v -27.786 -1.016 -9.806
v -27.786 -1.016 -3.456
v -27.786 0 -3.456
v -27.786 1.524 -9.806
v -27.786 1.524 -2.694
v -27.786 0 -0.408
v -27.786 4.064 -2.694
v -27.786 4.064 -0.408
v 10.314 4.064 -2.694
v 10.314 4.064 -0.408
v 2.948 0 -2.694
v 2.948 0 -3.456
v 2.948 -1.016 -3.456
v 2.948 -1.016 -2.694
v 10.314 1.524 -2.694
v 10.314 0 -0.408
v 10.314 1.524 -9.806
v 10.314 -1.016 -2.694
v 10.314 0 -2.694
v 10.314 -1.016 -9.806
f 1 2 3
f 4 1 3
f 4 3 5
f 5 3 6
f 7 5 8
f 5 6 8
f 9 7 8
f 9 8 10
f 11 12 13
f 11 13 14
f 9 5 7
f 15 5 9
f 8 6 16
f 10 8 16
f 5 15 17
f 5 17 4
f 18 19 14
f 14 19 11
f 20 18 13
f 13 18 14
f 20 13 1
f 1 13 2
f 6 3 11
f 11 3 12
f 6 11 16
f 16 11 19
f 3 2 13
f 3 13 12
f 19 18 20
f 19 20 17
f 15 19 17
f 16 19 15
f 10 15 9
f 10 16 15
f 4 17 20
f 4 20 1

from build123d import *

# Parameters (mm, degrees)
SKETCH1_W           = 38.1
SKETCH1_H           = 2.286
BOSS_EXTRUDE1_DEPTH = 4.064
SKETCH3_W           = 38.1
SKETCH3_H           = 2.54
BOSS_EXTRUDE3_DEPTH = 7.112
SKETCH4_W           = 0.762
SKETCH4_H           = 1.016
CUT_EXTRUDE1_DEPTH  = 30.734


with BuildPart() as part:
    # Sketch1 → Boss-Extrude1 (new body)
    with BuildSketch(Plane(origin=(0, 0, 0), x_dir=(1, 0, 0), z_dir=(0, 1, 0))):
        with Locations((-8.736060606, 1.550939394)):
            Rectangle(SKETCH1_W, SKETCH1_H)
    extrude(amount=BOSS_EXTRUDE1_DEPTH)

    # Sketch3 → Boss-Extrude3 (add)
    with BuildSketch(Plane(origin=(0, 0, -2.693939394), x_dir=(-1, 0, 0), z_dir=(0, 0, -1))):
        with Locations((8.736060606, 0.254)):
            Rectangle(SKETCH3_W, SKETCH3_H)
    extrude(amount=BOSS_EXTRUDE3_DEPTH)

    # Sketch4 → Cut-Extrude1 (cut)
    with BuildSketch(Plane.ZY.offset(27.786060606)):
        with Locations((-3.074939394, -0.508)):
            Rectangle(SKETCH4_W, SKETCH4_H)
    extrude(amount=-CUT_EXTRUDE1_DEPTH, mode=Mode.SUBTRACT)


solid = part.part
